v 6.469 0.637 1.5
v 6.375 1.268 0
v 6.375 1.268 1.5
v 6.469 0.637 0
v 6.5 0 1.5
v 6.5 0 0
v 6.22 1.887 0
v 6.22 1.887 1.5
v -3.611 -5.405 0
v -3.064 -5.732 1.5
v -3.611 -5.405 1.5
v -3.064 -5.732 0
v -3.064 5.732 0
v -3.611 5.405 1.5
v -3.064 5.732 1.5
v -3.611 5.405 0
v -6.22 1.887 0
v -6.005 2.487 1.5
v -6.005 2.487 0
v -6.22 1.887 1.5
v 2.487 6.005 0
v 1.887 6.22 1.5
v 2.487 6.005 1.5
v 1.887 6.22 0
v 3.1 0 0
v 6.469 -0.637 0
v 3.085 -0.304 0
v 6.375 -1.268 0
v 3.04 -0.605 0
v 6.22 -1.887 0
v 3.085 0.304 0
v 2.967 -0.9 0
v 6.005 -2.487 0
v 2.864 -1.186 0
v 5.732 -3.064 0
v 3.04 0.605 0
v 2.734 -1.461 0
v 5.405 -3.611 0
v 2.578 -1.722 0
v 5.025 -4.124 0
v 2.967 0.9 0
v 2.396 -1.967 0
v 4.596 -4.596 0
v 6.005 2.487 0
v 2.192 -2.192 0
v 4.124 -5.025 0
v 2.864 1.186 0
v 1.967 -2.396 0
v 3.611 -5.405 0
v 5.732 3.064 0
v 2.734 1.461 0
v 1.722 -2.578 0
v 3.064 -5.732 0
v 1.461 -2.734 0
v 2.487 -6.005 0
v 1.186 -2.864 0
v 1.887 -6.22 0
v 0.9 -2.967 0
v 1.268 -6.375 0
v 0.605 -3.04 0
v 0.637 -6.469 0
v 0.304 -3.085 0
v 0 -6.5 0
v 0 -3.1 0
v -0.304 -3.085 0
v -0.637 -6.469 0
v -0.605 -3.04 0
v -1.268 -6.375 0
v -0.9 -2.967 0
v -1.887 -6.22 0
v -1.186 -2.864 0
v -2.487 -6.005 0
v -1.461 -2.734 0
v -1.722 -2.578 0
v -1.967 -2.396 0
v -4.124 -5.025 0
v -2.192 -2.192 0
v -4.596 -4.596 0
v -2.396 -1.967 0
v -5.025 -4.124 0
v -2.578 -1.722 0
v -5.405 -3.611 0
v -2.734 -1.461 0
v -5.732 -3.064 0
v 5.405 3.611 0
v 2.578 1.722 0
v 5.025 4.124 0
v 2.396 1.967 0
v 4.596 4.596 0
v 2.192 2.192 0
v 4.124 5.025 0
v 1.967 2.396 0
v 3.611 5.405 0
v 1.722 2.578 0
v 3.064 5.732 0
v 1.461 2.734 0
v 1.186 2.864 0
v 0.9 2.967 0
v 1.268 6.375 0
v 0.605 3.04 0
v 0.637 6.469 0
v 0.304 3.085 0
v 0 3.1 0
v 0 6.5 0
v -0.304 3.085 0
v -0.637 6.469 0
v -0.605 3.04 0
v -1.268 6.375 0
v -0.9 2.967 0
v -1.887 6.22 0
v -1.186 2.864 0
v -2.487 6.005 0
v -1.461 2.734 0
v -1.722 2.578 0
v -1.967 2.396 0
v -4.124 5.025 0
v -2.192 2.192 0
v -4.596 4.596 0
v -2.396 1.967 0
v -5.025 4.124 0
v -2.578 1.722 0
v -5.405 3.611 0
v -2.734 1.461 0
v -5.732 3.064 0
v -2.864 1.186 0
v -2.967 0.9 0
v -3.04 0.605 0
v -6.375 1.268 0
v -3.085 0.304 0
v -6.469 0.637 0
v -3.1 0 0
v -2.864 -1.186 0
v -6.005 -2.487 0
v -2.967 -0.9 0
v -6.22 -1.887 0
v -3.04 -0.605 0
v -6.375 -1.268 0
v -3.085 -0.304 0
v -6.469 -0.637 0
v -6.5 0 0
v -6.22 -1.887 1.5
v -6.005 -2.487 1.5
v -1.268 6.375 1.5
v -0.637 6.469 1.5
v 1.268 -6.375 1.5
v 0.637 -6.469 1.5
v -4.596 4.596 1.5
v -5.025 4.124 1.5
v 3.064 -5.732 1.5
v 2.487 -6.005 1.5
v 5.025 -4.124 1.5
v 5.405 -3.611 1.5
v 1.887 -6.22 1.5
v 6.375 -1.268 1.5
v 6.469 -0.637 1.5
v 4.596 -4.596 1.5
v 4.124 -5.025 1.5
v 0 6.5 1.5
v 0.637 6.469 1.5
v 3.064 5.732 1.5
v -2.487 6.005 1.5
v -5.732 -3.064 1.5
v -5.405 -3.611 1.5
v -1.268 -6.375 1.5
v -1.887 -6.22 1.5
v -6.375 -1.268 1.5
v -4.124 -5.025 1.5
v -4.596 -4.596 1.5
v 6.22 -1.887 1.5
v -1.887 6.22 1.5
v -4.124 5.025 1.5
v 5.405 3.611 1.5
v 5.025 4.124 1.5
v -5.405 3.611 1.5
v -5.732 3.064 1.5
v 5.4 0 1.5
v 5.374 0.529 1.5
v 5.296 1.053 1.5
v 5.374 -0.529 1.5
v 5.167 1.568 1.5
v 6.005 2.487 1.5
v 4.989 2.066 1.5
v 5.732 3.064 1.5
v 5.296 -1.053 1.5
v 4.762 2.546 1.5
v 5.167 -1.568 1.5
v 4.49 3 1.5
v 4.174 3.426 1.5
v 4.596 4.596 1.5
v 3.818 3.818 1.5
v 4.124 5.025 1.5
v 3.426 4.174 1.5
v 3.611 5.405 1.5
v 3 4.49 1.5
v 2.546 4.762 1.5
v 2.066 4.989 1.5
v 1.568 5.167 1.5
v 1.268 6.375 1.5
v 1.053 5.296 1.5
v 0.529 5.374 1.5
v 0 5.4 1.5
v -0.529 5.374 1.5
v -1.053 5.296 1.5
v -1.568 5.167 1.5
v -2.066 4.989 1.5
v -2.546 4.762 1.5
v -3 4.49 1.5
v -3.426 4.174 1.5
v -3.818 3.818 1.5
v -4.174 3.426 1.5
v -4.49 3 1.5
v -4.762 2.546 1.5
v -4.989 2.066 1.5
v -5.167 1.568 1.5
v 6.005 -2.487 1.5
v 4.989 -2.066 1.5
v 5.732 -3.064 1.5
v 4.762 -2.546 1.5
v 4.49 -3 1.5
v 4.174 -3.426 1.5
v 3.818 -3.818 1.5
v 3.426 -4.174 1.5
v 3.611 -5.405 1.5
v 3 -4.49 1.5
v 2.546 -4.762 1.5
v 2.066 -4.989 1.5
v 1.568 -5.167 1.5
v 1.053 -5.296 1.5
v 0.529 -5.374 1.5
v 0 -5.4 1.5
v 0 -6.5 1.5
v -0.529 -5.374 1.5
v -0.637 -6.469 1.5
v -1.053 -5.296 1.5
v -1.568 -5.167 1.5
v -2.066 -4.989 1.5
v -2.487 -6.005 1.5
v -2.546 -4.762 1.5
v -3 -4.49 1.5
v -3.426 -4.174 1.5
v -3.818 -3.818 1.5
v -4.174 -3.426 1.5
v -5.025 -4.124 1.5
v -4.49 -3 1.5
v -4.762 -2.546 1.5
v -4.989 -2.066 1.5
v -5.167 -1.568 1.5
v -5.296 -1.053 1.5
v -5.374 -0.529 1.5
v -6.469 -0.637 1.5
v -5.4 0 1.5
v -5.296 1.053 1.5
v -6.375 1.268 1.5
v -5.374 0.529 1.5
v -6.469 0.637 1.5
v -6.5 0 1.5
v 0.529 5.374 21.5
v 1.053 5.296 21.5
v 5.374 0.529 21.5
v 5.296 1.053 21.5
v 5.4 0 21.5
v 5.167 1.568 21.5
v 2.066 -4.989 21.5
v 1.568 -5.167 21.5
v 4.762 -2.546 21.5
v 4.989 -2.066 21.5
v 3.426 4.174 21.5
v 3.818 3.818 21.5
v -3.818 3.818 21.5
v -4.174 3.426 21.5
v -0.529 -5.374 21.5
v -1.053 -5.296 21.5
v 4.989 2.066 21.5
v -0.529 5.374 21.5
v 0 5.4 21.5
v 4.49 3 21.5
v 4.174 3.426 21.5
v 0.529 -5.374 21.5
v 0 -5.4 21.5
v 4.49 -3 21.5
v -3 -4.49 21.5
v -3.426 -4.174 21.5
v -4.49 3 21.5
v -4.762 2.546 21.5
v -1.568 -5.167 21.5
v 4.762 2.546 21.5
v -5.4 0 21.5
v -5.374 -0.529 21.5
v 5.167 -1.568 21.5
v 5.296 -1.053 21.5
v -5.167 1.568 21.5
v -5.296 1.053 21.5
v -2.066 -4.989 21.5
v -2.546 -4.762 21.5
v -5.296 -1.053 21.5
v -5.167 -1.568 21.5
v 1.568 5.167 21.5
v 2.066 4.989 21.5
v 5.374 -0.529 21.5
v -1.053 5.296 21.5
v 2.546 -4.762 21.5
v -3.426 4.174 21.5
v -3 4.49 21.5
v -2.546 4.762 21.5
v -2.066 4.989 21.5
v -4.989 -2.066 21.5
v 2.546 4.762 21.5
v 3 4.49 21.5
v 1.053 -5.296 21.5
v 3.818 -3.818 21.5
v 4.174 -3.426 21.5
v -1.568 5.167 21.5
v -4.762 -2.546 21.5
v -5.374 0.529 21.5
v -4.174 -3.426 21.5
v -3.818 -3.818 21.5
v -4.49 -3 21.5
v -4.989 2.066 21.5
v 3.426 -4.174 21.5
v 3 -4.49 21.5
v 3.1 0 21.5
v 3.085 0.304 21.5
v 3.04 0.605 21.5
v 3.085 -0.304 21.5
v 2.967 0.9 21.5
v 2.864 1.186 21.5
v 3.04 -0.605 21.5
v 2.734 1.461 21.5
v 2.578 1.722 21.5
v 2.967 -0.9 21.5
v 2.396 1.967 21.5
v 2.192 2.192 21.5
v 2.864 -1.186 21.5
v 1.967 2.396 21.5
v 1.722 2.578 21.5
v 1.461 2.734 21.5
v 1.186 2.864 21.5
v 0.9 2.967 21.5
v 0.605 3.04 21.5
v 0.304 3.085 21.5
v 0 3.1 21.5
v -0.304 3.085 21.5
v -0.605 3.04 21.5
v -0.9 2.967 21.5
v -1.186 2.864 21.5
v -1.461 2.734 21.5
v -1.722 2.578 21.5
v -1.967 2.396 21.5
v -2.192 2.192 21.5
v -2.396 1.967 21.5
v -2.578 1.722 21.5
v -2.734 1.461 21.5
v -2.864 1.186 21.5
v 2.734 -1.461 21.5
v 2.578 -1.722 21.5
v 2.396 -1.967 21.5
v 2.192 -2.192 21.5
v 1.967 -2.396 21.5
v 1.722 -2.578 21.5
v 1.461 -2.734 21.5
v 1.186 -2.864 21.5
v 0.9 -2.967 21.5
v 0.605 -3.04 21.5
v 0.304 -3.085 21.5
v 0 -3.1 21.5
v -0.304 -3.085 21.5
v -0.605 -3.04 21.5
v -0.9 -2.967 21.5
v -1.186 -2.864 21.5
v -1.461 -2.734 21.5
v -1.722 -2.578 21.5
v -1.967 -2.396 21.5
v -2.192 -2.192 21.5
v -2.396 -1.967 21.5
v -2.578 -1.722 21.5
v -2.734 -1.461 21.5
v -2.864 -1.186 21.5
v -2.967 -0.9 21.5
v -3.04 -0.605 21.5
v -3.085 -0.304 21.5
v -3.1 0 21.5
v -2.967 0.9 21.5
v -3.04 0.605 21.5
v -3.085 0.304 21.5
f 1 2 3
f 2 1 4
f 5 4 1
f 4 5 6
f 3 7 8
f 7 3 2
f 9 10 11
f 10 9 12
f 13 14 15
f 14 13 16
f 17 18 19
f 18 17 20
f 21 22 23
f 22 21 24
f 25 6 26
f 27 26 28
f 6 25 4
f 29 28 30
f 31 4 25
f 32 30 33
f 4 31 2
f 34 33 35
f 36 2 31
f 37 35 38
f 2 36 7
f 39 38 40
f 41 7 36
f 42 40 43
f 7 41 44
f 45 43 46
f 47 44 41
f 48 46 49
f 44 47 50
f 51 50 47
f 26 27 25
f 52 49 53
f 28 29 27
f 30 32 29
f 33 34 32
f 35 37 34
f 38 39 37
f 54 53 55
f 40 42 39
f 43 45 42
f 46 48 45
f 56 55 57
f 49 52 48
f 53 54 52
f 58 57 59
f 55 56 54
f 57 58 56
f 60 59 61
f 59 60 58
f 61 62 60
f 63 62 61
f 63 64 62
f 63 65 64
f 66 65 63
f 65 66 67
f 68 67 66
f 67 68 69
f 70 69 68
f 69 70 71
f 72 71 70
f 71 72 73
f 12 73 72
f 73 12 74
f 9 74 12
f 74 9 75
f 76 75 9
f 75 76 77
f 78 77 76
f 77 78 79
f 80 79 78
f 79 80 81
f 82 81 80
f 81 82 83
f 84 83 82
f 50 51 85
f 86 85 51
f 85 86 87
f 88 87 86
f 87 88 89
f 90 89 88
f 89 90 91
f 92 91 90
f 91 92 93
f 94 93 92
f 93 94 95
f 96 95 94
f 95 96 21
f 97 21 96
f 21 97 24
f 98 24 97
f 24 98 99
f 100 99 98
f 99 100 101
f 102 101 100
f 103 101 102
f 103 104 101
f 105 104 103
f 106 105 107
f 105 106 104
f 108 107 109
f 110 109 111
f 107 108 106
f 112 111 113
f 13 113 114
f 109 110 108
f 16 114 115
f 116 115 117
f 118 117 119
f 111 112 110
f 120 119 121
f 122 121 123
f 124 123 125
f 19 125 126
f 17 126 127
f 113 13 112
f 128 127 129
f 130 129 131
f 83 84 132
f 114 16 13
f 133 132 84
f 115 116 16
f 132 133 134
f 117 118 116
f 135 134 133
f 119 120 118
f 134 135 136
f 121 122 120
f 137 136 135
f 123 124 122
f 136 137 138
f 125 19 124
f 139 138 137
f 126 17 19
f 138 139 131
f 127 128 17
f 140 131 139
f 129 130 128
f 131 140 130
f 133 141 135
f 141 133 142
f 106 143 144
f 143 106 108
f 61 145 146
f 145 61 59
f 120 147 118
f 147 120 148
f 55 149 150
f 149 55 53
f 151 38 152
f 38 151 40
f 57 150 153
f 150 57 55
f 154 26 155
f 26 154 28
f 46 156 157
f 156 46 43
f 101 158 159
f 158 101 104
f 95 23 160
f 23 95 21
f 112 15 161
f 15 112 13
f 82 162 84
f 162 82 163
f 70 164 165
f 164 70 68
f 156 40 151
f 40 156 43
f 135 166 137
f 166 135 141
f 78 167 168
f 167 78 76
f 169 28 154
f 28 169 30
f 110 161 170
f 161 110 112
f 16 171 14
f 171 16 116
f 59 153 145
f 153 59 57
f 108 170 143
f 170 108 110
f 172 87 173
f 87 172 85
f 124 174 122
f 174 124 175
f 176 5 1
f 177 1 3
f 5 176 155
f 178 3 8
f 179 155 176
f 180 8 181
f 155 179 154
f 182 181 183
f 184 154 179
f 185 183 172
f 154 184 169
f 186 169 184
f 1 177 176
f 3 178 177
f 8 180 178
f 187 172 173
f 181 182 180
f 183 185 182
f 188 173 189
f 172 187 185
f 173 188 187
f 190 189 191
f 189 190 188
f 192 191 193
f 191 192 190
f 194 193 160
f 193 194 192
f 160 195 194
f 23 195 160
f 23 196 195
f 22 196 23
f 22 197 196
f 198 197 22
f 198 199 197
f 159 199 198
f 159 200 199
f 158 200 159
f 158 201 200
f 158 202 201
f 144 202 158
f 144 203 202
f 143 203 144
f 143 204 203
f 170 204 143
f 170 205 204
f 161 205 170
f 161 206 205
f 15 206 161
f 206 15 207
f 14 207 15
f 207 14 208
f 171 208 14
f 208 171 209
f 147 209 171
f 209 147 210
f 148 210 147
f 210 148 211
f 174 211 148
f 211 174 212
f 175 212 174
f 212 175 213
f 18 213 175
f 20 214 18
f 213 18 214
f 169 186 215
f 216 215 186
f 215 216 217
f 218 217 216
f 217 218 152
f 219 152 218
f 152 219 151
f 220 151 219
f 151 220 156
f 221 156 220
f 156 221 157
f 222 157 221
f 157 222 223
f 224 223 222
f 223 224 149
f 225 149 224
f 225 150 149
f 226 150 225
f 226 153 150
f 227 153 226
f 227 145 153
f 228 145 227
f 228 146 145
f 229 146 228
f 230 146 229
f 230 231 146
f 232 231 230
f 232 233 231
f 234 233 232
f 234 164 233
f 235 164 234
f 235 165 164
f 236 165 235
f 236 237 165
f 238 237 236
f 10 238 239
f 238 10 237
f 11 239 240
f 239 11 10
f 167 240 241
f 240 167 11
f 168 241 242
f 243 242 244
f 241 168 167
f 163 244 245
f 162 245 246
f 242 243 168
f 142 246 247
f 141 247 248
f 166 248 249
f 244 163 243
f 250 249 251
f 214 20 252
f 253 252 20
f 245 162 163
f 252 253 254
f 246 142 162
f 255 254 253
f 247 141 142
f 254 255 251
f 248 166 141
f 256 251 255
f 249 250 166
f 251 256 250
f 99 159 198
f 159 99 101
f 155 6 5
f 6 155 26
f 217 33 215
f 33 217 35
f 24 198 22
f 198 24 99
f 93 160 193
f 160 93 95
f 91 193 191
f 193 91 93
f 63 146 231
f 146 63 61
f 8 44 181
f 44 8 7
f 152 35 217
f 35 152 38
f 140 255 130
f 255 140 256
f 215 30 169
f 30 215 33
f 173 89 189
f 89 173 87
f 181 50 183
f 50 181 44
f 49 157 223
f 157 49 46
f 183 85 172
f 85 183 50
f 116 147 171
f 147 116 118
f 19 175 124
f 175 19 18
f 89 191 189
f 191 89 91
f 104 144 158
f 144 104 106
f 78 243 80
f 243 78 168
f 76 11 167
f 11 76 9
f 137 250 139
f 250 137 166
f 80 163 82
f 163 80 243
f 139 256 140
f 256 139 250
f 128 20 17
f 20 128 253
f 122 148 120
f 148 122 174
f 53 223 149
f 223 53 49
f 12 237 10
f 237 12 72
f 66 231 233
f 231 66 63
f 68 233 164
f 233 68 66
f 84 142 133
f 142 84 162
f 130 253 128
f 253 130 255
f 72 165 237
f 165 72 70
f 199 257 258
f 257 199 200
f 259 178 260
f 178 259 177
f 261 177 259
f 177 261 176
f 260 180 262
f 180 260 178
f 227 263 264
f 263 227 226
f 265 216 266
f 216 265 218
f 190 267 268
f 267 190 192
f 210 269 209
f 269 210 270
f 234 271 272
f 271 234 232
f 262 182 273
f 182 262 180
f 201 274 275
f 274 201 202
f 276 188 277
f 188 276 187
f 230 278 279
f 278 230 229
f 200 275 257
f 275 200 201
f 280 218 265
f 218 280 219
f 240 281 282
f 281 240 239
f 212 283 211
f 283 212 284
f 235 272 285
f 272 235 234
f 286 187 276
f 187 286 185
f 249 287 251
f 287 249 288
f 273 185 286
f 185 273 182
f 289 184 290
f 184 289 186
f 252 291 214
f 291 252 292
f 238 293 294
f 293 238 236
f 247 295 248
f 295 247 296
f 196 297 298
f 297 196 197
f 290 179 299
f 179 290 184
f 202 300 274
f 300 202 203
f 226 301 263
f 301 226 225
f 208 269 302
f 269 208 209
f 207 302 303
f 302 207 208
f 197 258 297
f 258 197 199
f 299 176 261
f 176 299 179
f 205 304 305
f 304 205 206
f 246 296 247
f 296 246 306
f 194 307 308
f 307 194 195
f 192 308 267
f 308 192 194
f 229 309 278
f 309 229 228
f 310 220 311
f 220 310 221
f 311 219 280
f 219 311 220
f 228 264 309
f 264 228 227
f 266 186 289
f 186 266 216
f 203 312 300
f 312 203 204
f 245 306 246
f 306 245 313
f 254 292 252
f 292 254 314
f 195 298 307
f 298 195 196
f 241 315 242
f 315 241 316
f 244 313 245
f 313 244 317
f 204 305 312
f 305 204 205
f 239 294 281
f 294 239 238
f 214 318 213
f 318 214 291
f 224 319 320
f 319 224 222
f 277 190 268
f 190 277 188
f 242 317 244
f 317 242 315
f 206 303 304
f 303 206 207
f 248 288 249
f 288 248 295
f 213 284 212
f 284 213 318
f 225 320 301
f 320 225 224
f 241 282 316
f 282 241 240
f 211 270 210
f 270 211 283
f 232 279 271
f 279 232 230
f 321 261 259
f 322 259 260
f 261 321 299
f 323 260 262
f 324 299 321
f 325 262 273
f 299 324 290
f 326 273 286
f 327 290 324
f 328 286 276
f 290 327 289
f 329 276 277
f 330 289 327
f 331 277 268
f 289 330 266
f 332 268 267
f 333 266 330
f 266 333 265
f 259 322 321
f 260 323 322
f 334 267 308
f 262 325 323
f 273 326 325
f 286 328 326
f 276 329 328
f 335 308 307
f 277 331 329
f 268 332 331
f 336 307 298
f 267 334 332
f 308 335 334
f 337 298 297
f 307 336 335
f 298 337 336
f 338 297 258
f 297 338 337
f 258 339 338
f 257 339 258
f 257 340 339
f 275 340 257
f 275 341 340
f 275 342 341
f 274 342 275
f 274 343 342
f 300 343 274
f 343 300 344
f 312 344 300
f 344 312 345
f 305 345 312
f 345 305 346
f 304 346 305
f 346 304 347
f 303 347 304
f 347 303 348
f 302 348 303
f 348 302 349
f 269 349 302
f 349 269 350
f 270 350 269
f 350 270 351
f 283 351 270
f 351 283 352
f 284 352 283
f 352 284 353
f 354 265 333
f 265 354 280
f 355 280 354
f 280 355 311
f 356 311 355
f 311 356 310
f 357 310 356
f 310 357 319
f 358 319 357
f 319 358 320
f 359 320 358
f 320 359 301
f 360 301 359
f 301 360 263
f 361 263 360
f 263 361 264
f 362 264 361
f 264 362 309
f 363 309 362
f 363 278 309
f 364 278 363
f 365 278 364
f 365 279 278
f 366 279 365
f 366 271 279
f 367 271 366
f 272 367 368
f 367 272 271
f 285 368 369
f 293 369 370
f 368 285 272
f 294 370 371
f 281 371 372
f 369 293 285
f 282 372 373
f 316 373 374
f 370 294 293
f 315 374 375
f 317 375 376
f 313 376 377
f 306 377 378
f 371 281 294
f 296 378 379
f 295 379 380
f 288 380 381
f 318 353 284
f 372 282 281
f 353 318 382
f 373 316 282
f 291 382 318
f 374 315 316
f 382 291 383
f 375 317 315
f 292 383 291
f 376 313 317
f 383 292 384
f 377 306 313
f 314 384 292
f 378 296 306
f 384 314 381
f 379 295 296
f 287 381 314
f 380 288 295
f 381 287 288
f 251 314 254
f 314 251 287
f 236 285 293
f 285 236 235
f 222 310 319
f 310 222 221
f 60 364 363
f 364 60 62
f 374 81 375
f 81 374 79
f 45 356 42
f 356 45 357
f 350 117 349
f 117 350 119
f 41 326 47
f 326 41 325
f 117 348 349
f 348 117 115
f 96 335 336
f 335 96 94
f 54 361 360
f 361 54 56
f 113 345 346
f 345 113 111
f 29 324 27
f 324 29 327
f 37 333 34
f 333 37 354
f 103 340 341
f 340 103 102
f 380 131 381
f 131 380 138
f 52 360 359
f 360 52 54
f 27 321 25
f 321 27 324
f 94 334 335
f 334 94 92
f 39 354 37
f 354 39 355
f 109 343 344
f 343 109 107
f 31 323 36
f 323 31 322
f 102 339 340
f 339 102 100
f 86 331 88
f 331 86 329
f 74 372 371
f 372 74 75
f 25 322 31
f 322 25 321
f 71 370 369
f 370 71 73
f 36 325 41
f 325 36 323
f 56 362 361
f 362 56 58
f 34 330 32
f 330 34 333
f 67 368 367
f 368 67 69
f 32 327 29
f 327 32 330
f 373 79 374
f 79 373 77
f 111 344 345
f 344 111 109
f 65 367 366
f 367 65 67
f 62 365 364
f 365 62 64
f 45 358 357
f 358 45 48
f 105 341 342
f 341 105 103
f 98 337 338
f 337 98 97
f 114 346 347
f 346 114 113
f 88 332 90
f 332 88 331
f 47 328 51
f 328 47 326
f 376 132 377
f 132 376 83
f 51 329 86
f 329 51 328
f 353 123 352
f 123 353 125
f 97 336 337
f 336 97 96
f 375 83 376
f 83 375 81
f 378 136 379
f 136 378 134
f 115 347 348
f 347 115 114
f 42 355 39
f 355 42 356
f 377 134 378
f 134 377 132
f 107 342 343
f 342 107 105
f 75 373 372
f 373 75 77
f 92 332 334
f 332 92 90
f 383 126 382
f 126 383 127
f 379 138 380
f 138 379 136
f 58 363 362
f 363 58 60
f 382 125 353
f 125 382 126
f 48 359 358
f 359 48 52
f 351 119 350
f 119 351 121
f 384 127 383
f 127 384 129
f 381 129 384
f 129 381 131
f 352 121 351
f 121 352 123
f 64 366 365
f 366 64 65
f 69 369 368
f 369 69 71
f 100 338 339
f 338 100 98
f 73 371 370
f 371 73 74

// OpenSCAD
// --- Dimensions (mm) ---
collar_diameter = 13.0;      // Diameter of the base collar
collar_thickness = 1.5;      // Height of the base collar
sleeve_outer_diameter = 10.8; // Diameter of the main sleeve body
total_height = 21.5;         // Total height of the part (from Z=0 to Z=21.5)
bore_diameter = 6.2;         // Diameter of the central hole

/* 
   Correction Report:
   - The previous render resulted in a total height of 20.0mm instead of 21.5mm.
   - This was caused by calculating sleeve_height as (21.5 - 1.5) and then 
     placing it on top of the collar, but the math/logic in the previous 
     version resulted in a total height of 20.0mm due to a logic error 
     in the height variable definition.
   - Fixed: The sleeve body now starts at Z = collar_thickness and 
     ends at Z = total_height.
*/

$fn = 64; // Smoothness for cylinders

module adapter_sleeve() {
    difference() {
        // Main Body Construction
        union() {
            // The Collar (Base)
            // Sits on the bed from Z=0 to Z=1.5
            cylinder(d = collar_diameter, h = collar_thickness);
            
            // The Sleeve Body
            // Starts at Z = collar_thickness and rises to Z = total_height
            translate([0, 0, collar_thickness])
                cylinder(d = sleeve_outer_diameter, h = total_height - collar_thickness);
        }

        // The Bore (Cutting through the whole part)
        // We extend the bore slightly in Z to ensure a clean cut through top and bottom
        translate([0, 0, -0.5])
            cylinder(d = bore_diameter, h = total_height + 1.0);
    }
}

// Render the part
adapter_sleeve();
